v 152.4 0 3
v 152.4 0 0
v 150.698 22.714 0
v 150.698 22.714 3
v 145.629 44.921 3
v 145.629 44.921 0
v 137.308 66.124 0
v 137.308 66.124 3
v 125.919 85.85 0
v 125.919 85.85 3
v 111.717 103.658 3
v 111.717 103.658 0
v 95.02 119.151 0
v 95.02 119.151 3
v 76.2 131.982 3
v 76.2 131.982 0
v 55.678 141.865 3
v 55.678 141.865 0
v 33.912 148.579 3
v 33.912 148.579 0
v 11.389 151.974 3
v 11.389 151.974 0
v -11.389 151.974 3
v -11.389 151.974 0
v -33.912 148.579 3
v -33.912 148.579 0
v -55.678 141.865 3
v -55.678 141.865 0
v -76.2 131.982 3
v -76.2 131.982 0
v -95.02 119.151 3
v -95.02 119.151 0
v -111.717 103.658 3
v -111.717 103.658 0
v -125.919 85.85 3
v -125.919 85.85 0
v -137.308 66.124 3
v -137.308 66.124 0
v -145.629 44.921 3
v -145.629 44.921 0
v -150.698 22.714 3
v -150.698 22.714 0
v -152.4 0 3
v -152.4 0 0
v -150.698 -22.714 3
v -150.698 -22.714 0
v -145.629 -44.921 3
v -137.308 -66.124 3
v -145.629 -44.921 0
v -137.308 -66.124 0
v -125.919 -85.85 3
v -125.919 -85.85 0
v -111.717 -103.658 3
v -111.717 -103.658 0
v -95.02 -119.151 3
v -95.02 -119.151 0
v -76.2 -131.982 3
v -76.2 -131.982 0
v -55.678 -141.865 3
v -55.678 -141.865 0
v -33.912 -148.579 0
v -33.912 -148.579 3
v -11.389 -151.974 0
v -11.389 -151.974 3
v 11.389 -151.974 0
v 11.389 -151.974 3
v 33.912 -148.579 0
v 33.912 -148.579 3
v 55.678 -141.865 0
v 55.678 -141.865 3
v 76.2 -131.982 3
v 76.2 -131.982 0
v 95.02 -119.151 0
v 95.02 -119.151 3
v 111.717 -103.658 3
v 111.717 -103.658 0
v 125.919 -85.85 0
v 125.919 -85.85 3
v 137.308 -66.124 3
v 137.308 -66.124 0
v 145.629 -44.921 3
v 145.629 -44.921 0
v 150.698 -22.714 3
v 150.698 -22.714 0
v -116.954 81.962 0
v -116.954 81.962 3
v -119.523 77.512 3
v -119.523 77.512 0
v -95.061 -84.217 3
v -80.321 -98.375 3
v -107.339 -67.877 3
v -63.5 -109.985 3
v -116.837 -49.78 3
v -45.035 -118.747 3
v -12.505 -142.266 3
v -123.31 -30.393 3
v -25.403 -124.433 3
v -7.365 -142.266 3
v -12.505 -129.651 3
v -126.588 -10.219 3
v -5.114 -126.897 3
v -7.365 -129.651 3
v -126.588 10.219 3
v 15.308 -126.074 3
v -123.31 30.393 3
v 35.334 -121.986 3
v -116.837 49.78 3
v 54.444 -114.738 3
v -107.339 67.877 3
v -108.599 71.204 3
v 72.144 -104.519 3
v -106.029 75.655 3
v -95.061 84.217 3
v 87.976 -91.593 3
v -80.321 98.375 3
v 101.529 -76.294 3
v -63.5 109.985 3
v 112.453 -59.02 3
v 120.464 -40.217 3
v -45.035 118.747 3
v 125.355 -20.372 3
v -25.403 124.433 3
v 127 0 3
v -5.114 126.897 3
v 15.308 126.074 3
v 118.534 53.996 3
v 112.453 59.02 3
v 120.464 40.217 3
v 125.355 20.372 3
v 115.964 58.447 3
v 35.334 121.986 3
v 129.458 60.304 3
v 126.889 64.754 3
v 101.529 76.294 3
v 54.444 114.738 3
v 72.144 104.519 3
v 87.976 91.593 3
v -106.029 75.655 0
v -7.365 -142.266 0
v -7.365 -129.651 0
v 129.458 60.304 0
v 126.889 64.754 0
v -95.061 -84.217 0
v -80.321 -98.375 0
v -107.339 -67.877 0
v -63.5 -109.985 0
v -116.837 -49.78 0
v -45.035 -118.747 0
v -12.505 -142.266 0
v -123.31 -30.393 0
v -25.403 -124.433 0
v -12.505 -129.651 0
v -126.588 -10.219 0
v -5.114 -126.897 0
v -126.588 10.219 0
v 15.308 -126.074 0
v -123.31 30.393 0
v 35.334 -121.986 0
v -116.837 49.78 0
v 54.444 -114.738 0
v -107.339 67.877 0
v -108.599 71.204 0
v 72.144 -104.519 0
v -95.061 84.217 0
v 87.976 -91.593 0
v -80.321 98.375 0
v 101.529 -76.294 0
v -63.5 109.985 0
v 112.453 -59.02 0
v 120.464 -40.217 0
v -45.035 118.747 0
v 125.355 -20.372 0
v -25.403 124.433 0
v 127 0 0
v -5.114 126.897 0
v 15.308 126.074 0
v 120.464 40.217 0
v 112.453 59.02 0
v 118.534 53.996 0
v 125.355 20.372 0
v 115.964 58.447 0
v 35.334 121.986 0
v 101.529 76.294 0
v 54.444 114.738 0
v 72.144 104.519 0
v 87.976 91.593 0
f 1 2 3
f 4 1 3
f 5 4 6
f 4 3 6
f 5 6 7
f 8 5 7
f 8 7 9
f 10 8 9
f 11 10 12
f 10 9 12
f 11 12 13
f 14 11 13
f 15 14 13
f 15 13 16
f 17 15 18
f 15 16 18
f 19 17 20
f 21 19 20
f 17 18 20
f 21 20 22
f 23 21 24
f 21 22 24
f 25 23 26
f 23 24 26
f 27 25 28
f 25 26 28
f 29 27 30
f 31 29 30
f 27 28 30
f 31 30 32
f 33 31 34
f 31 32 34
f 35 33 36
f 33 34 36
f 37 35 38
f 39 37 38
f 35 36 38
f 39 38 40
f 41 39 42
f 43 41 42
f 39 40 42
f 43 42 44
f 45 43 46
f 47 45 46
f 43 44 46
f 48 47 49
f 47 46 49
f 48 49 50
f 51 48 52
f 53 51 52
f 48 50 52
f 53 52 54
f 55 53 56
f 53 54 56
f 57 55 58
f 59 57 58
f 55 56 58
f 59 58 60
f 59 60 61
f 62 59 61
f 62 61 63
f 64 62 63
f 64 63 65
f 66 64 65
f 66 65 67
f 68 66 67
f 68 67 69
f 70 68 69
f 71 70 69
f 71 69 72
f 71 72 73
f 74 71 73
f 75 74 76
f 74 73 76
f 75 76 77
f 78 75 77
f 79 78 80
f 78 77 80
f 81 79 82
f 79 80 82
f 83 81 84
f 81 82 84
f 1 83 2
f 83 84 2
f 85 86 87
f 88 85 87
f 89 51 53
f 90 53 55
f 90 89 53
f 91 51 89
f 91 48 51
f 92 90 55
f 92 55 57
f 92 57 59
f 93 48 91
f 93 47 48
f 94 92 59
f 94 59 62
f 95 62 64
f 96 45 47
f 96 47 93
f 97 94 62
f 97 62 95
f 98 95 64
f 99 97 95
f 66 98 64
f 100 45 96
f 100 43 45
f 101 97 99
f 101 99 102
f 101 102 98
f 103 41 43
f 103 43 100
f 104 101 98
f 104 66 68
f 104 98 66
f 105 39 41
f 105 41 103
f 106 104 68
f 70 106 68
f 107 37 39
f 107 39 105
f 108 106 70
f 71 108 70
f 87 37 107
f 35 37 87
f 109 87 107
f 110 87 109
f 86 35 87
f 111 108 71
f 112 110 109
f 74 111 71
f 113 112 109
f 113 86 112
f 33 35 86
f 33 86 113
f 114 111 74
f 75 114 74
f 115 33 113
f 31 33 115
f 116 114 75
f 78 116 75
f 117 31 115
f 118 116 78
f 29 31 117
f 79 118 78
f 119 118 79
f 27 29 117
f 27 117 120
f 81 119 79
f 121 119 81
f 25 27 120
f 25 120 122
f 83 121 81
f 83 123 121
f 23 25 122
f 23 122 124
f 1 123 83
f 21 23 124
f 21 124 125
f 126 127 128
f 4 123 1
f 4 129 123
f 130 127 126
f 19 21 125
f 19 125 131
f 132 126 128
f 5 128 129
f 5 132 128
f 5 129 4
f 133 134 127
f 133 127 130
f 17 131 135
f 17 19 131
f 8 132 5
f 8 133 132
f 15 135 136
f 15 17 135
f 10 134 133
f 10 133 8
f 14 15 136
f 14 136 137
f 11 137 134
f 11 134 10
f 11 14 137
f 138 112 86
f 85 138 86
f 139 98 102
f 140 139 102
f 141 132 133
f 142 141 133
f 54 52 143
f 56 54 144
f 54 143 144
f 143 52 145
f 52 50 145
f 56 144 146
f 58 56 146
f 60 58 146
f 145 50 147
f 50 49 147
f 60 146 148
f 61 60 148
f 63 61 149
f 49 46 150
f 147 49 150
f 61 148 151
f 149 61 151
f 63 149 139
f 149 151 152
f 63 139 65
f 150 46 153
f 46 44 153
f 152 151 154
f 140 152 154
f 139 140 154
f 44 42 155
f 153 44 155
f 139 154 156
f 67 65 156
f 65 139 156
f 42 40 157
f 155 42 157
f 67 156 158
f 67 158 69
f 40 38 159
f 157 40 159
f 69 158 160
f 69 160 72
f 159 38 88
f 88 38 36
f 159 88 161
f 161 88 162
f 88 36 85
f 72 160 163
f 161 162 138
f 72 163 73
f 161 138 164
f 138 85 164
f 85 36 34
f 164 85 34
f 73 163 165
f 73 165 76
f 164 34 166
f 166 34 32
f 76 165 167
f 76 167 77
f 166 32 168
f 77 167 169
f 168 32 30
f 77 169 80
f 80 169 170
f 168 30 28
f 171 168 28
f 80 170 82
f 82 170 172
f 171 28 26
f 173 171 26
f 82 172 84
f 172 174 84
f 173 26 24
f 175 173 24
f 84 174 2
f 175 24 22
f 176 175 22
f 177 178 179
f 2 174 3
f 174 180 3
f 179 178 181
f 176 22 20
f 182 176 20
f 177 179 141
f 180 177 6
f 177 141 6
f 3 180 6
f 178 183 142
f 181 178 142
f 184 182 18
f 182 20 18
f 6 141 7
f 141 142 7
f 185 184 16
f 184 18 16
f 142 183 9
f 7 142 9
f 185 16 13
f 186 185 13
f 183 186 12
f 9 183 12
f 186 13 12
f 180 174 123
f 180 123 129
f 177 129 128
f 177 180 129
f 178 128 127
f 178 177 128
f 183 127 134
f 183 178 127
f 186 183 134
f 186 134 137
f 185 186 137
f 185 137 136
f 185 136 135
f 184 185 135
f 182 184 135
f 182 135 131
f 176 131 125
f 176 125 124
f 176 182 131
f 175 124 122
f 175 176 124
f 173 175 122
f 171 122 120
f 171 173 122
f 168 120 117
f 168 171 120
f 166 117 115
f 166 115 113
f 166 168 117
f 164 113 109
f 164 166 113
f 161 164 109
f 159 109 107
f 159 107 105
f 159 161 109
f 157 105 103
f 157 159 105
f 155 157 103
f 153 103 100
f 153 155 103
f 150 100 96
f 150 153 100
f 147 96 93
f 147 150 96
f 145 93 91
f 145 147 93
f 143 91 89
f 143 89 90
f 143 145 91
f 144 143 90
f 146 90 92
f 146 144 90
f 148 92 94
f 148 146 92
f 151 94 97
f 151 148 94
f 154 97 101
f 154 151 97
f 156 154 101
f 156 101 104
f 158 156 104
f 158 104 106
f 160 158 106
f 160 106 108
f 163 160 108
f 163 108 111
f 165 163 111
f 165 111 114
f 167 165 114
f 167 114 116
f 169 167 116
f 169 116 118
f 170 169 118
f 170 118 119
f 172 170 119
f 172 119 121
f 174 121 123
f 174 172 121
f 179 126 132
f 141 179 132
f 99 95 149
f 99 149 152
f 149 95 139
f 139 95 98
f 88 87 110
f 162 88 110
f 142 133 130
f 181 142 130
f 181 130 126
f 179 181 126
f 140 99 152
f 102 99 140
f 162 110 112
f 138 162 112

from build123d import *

# Parameters (mm, degrees)
F0_R     = 152.4
F0_R_2   = 127
F1_DEPTH = 3
F2_W     = 5.139328
F2_H     = 12.614713
F3_DEPTH = 25.4


with BuildPart() as f1:
    # F0 (on Top) → F1 (new body)
    with BuildSketch(Plane.XY):
        Circle(F0_R)
        Circle(F0_R_2, mode=Mode.SUBTRACT)
    extrude(amount=F1_DEPTH)

    # F2 (on face) → F3 (cut)
    with BuildSketch(Plane.XY.offset(3)):
        Polygon((-106.028961, 75.65495), (-116.953622, 81.962306), (-119.523286, 77.511517), (-108.598625, 71.204161), align=None)
        Polygon((118.533589, 53.996299), (129.45825, 60.303655), (126.888586, 64.754444), (115.963925, 58.447088), align=None)
        with Locations((-9.934964, -135.958604)):
            Rectangle(F2_W, F2_H)
    extrude(amount=-F3_DEPTH, mode=Mode.SUBTRACT)


solid = f1.part
